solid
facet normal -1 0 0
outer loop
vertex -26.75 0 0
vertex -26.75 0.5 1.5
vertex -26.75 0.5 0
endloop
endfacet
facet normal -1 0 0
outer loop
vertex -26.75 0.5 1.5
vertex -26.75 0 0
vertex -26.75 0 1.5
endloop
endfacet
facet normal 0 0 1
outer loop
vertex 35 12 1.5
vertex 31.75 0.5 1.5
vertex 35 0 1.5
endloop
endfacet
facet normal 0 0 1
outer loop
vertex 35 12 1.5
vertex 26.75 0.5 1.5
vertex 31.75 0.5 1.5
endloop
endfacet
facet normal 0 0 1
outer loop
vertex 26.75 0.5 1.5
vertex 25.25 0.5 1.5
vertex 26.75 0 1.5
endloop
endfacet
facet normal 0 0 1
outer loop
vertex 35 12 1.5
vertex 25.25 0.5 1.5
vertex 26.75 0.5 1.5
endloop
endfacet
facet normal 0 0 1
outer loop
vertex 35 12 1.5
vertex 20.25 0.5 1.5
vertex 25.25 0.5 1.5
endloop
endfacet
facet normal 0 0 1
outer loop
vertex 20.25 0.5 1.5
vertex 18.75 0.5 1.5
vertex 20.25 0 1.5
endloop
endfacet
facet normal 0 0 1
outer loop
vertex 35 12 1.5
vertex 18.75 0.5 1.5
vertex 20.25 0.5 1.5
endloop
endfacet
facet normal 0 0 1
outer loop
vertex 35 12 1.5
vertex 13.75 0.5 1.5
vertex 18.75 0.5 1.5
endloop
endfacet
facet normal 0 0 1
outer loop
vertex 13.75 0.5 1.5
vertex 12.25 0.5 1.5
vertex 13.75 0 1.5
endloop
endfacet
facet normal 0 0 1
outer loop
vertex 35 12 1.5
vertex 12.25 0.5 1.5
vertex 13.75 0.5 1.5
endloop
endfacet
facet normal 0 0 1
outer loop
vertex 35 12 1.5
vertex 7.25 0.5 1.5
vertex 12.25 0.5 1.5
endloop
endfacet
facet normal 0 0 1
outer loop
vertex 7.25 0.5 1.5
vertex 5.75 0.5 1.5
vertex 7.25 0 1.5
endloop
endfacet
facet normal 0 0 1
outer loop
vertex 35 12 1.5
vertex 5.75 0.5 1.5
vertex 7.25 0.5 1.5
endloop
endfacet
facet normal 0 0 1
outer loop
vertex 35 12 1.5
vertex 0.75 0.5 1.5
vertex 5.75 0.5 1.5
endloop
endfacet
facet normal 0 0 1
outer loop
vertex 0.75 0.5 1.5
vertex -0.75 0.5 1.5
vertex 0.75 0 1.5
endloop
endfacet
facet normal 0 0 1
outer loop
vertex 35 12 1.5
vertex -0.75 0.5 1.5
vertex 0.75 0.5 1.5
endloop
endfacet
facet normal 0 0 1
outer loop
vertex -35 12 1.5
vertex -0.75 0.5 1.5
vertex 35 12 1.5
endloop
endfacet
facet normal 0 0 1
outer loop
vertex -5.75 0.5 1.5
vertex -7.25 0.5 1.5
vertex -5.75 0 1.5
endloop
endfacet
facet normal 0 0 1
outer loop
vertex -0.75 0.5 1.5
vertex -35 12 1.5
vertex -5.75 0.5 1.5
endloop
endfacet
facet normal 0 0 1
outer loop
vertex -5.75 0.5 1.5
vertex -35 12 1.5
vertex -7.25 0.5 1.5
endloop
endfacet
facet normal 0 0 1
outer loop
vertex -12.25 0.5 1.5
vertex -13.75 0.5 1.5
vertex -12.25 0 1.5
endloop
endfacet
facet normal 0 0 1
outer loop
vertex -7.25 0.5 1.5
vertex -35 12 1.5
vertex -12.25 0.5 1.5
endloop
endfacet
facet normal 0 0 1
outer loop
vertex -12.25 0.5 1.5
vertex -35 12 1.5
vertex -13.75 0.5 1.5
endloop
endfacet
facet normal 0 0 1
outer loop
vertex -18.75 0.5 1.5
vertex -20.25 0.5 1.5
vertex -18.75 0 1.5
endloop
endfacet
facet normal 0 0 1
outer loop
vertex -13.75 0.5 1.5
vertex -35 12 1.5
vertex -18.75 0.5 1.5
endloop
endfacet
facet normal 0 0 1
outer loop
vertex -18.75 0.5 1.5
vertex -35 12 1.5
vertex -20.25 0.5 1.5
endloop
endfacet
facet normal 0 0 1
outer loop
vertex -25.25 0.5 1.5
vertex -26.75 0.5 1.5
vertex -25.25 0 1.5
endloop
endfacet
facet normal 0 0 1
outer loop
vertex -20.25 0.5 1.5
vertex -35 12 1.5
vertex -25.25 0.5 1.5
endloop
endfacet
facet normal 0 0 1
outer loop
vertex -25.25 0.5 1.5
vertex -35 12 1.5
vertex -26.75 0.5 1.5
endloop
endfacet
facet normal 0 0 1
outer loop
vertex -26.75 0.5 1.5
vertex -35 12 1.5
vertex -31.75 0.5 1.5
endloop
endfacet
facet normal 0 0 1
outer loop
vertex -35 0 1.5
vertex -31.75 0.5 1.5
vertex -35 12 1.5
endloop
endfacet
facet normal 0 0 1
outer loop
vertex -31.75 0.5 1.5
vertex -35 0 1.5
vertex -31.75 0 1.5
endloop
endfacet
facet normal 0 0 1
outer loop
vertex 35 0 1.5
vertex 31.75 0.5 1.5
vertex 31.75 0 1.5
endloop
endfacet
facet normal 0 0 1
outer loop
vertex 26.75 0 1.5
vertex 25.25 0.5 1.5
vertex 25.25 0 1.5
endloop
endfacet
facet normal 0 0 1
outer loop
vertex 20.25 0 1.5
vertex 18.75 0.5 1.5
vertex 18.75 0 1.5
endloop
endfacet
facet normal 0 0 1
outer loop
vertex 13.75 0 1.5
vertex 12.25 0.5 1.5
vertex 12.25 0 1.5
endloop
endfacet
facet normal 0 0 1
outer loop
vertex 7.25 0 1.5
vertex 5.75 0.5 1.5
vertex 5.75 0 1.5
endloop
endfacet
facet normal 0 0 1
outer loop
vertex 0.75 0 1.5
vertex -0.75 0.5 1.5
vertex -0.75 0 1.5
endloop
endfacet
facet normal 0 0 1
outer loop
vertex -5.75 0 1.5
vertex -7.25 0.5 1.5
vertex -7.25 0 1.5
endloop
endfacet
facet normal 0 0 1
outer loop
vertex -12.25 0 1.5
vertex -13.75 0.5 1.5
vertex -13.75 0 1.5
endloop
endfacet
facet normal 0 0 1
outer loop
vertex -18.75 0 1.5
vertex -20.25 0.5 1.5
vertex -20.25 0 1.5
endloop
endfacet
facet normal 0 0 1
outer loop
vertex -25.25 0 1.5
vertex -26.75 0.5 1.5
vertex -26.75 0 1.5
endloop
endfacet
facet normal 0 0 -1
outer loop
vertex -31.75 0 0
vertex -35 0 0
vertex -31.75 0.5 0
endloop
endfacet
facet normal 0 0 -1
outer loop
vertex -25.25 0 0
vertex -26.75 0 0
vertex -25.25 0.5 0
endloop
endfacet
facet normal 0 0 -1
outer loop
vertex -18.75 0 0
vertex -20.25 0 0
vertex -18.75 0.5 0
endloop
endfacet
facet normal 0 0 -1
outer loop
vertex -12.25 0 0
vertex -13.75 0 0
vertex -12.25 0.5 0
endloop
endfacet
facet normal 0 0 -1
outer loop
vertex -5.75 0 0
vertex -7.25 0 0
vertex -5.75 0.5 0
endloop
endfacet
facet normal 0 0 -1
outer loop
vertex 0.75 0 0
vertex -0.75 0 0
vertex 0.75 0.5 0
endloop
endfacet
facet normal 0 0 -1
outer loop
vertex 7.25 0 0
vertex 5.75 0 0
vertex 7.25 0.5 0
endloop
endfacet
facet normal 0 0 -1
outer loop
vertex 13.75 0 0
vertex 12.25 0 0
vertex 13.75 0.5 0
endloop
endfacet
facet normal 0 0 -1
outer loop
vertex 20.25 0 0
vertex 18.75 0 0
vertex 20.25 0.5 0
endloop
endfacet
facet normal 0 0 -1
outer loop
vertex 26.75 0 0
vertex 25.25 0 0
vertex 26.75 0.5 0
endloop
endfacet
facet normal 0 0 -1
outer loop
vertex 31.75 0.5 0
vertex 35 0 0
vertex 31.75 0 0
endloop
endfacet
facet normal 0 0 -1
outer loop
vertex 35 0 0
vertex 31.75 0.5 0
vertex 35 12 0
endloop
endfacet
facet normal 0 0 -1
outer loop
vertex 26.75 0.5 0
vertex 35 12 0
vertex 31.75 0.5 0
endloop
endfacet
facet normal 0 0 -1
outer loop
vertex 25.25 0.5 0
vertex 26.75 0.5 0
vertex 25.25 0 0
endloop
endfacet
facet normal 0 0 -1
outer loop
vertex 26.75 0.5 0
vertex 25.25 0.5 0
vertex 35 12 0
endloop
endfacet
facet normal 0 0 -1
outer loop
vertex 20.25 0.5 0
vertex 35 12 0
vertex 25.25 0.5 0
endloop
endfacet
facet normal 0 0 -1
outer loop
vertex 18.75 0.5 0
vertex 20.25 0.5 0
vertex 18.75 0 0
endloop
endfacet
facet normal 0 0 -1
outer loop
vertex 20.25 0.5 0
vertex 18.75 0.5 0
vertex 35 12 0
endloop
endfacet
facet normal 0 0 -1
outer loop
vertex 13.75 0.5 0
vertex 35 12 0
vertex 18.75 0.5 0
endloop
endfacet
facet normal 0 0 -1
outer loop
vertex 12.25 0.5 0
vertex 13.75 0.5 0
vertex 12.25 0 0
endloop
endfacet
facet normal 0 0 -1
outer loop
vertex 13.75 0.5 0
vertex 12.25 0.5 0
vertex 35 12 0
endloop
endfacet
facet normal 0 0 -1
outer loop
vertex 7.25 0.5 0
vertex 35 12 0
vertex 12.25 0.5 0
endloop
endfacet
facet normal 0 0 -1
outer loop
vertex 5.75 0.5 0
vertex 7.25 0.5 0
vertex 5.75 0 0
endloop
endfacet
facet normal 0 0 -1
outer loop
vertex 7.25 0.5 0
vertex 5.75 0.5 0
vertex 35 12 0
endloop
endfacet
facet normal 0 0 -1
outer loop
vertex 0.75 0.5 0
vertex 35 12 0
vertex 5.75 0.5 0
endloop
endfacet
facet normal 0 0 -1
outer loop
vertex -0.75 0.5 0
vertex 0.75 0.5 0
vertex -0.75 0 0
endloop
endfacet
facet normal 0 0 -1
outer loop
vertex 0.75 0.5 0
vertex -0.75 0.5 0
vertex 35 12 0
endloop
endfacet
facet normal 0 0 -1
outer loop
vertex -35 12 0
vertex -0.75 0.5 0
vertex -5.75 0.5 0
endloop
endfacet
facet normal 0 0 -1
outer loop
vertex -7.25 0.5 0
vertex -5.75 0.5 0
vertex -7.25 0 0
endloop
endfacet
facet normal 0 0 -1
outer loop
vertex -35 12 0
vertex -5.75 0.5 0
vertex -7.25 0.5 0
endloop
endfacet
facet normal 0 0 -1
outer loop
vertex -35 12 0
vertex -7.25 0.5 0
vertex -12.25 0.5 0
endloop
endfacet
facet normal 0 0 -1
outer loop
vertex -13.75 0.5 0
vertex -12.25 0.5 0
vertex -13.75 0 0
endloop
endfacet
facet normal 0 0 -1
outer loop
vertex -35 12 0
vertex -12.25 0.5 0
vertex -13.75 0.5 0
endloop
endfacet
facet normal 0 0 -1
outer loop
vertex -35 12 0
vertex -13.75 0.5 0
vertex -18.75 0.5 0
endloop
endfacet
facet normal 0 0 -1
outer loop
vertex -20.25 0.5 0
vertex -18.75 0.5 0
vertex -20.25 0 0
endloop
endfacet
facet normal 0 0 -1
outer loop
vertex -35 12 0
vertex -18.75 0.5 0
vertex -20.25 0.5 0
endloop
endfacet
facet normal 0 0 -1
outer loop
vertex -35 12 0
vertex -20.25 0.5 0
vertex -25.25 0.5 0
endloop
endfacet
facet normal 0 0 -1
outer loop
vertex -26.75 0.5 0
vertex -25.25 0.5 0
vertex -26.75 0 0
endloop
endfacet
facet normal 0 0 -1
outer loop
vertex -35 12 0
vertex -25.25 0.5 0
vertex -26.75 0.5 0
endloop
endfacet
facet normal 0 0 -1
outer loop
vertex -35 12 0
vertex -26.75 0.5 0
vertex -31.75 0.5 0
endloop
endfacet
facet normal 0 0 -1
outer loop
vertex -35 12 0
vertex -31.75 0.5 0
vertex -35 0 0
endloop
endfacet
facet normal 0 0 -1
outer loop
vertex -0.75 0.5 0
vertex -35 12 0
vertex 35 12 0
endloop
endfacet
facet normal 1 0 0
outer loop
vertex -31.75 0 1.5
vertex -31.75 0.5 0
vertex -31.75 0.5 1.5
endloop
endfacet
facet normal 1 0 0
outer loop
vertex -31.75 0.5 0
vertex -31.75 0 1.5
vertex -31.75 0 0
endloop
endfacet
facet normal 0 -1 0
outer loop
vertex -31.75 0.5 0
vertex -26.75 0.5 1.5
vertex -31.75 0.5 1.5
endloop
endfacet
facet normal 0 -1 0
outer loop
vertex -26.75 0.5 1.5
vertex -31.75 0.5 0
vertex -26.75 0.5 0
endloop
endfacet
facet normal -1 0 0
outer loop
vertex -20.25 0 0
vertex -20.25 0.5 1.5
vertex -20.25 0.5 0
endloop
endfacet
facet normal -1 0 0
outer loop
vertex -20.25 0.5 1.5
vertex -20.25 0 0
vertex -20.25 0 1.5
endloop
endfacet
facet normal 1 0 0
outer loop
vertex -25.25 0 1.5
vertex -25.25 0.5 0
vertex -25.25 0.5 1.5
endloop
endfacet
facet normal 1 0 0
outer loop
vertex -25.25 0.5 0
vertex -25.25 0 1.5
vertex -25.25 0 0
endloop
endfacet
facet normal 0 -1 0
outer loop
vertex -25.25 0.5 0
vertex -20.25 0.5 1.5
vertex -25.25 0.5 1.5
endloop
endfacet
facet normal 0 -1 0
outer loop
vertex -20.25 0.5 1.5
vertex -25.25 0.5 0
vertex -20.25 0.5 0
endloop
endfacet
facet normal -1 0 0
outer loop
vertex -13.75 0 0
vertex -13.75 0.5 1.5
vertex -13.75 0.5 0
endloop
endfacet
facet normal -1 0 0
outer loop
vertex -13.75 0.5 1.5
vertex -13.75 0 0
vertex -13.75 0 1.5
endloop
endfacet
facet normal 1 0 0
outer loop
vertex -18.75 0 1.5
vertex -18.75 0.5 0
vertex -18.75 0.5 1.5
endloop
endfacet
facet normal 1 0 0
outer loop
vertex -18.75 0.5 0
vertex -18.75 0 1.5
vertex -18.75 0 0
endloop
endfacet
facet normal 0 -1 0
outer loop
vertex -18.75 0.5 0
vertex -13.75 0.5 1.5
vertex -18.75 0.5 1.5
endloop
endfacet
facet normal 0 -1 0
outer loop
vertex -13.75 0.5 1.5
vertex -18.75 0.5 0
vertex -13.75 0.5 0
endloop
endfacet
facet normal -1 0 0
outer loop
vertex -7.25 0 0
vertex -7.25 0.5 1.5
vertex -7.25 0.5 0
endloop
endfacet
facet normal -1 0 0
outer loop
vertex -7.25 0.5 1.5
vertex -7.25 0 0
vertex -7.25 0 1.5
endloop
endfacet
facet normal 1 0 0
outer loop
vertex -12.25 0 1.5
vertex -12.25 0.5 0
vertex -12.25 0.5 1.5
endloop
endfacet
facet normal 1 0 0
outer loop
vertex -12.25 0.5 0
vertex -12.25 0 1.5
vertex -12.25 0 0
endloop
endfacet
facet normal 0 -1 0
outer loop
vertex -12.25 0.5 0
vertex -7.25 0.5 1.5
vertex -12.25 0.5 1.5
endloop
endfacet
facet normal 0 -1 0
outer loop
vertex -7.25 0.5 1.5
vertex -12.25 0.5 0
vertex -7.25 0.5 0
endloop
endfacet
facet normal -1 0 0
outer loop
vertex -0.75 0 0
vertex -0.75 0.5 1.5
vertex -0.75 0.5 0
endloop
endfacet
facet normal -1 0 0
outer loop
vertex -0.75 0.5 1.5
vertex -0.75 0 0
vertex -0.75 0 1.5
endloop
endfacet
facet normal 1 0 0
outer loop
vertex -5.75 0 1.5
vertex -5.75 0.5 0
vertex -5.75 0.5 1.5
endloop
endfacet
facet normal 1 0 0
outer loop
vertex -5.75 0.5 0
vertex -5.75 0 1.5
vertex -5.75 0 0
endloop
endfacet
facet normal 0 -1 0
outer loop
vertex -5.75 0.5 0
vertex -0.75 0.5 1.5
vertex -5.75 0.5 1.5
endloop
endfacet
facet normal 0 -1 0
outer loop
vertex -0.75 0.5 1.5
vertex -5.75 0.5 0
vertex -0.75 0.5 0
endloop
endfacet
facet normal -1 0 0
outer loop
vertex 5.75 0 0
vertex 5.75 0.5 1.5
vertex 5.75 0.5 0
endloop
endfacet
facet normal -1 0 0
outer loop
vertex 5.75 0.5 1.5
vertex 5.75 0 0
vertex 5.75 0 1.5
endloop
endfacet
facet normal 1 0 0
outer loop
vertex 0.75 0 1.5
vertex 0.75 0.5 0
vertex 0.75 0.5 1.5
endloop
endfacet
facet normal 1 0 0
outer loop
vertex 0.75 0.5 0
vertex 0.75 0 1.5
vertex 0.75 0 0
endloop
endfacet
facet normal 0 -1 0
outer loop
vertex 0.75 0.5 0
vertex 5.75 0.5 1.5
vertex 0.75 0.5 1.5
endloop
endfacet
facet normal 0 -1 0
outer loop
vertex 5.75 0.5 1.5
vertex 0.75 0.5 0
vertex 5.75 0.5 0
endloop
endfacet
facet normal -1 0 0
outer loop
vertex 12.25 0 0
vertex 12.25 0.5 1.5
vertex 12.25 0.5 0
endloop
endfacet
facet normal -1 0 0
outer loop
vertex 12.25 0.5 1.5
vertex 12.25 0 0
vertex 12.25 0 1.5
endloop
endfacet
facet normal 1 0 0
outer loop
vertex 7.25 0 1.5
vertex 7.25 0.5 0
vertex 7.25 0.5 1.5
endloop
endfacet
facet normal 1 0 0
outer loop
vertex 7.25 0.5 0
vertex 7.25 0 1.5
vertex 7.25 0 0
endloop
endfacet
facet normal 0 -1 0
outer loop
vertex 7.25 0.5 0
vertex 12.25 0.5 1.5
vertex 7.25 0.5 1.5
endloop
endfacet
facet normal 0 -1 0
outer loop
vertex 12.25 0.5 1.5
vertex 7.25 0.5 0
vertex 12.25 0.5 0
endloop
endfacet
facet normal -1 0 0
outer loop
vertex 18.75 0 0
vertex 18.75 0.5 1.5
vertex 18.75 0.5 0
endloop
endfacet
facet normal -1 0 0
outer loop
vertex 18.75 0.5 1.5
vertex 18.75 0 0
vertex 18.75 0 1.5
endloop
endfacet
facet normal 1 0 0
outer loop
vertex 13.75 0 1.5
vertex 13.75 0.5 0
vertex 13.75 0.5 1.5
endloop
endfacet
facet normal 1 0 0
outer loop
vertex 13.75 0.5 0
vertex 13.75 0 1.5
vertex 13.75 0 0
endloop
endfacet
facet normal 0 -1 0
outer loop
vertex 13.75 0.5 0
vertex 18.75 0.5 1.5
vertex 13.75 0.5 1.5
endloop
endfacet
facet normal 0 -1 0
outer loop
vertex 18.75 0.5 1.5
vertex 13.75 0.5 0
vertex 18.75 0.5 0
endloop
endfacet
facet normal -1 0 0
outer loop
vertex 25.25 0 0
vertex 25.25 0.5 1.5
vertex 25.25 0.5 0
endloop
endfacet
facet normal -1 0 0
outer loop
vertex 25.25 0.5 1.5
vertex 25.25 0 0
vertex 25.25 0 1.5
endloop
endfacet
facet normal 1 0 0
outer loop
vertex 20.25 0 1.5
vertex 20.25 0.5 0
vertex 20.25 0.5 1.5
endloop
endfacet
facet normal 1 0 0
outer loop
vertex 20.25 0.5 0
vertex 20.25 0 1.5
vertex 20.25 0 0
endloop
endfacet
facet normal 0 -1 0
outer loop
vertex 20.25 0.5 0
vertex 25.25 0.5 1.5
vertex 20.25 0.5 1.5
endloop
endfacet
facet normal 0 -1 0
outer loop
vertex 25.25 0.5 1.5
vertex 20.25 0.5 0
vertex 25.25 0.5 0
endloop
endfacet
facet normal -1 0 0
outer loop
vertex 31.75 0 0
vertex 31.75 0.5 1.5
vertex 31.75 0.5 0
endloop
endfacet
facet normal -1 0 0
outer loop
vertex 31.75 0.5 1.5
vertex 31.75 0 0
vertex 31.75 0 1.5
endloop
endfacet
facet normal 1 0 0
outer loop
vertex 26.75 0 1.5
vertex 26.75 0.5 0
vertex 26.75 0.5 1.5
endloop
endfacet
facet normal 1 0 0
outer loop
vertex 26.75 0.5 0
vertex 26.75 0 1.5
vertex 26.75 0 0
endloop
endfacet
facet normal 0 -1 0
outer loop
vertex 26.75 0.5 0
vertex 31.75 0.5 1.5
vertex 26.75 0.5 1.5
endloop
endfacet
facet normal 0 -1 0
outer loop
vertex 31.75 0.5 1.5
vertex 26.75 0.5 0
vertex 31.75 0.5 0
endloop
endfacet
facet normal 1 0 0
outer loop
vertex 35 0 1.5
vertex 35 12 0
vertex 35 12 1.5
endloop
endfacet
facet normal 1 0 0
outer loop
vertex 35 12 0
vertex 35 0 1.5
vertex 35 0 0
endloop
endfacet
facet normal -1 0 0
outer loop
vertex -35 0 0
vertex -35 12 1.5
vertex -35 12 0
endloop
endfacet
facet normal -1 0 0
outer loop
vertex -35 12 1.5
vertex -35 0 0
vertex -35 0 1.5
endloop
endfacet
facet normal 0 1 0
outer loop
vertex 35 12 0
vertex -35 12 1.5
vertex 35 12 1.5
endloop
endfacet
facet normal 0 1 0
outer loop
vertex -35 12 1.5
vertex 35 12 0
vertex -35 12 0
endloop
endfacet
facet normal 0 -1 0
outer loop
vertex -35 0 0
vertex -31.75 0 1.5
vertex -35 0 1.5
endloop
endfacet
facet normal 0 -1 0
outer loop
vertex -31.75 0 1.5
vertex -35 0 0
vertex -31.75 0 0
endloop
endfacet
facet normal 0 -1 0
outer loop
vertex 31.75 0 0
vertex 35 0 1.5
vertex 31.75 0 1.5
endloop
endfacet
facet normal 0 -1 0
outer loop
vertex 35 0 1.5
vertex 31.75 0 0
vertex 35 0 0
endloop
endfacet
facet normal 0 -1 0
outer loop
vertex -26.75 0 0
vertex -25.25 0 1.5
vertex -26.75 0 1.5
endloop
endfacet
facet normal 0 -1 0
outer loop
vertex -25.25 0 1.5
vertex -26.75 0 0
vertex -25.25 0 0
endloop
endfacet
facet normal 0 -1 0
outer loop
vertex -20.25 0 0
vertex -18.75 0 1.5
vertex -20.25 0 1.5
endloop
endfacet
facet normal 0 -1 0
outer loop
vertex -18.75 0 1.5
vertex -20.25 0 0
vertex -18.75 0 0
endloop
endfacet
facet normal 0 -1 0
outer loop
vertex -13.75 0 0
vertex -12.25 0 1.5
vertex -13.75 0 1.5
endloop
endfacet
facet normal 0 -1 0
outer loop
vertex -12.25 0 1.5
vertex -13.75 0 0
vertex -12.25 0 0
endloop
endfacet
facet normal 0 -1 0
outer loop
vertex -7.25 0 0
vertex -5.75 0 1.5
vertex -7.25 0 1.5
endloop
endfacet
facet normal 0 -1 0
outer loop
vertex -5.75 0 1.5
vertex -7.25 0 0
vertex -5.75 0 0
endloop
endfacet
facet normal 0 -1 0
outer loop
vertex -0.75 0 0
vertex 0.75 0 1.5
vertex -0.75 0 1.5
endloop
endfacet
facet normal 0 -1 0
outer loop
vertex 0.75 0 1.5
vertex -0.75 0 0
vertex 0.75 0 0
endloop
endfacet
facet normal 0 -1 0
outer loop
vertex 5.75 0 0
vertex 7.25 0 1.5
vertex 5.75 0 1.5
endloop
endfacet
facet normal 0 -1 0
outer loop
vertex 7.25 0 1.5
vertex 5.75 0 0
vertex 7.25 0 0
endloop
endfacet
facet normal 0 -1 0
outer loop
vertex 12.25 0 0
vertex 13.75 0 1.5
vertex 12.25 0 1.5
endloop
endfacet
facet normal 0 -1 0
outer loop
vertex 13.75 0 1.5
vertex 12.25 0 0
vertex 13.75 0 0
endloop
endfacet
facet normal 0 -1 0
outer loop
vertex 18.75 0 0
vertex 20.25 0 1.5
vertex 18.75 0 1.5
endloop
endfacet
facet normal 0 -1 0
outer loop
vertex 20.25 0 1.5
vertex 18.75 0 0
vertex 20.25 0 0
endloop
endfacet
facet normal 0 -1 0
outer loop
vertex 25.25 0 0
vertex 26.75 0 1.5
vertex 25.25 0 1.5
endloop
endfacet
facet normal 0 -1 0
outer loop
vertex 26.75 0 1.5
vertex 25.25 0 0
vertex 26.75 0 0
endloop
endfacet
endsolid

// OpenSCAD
// 10-well comb for agarose gel casting, printed lying flat
// Units: mm

// ---- Spine (back bar) ----
spine_len   = 70;    // spine length along X
spine_wid   = 12;    // spine width along Y

// ---- Teeth ----
tooth_count = 10;    // number of wells
tooth_w     = 5.0;   // tooth width along X
tooth_len   = 12;    // tooth length along Y (hangs from -Y edge)
gap         = 1.5;   // gap between neighbouring teeth

// ---- Misc ----
eps         = 0.5;   // overcut for clean differences

$fn = 64;

pitch = tooth_w + gap;   // centre-to-centre spacing of teeth

difference() {
    // Spine plate
    translate([-spine_len/2, 0, 0])
        cube([spine_len, spine_wid, 1.5]);

    // Teeth, row centred on spine in X
    for (i = [0 : tooth_count - 1]) {
        x = (i - (tooth_count - 1)/2) * pitch;
        translate([x - tooth_w/2, -tooth_len, 0])
            cube([tooth_w, tooth_len + eps, 1.5]);
    }
}
